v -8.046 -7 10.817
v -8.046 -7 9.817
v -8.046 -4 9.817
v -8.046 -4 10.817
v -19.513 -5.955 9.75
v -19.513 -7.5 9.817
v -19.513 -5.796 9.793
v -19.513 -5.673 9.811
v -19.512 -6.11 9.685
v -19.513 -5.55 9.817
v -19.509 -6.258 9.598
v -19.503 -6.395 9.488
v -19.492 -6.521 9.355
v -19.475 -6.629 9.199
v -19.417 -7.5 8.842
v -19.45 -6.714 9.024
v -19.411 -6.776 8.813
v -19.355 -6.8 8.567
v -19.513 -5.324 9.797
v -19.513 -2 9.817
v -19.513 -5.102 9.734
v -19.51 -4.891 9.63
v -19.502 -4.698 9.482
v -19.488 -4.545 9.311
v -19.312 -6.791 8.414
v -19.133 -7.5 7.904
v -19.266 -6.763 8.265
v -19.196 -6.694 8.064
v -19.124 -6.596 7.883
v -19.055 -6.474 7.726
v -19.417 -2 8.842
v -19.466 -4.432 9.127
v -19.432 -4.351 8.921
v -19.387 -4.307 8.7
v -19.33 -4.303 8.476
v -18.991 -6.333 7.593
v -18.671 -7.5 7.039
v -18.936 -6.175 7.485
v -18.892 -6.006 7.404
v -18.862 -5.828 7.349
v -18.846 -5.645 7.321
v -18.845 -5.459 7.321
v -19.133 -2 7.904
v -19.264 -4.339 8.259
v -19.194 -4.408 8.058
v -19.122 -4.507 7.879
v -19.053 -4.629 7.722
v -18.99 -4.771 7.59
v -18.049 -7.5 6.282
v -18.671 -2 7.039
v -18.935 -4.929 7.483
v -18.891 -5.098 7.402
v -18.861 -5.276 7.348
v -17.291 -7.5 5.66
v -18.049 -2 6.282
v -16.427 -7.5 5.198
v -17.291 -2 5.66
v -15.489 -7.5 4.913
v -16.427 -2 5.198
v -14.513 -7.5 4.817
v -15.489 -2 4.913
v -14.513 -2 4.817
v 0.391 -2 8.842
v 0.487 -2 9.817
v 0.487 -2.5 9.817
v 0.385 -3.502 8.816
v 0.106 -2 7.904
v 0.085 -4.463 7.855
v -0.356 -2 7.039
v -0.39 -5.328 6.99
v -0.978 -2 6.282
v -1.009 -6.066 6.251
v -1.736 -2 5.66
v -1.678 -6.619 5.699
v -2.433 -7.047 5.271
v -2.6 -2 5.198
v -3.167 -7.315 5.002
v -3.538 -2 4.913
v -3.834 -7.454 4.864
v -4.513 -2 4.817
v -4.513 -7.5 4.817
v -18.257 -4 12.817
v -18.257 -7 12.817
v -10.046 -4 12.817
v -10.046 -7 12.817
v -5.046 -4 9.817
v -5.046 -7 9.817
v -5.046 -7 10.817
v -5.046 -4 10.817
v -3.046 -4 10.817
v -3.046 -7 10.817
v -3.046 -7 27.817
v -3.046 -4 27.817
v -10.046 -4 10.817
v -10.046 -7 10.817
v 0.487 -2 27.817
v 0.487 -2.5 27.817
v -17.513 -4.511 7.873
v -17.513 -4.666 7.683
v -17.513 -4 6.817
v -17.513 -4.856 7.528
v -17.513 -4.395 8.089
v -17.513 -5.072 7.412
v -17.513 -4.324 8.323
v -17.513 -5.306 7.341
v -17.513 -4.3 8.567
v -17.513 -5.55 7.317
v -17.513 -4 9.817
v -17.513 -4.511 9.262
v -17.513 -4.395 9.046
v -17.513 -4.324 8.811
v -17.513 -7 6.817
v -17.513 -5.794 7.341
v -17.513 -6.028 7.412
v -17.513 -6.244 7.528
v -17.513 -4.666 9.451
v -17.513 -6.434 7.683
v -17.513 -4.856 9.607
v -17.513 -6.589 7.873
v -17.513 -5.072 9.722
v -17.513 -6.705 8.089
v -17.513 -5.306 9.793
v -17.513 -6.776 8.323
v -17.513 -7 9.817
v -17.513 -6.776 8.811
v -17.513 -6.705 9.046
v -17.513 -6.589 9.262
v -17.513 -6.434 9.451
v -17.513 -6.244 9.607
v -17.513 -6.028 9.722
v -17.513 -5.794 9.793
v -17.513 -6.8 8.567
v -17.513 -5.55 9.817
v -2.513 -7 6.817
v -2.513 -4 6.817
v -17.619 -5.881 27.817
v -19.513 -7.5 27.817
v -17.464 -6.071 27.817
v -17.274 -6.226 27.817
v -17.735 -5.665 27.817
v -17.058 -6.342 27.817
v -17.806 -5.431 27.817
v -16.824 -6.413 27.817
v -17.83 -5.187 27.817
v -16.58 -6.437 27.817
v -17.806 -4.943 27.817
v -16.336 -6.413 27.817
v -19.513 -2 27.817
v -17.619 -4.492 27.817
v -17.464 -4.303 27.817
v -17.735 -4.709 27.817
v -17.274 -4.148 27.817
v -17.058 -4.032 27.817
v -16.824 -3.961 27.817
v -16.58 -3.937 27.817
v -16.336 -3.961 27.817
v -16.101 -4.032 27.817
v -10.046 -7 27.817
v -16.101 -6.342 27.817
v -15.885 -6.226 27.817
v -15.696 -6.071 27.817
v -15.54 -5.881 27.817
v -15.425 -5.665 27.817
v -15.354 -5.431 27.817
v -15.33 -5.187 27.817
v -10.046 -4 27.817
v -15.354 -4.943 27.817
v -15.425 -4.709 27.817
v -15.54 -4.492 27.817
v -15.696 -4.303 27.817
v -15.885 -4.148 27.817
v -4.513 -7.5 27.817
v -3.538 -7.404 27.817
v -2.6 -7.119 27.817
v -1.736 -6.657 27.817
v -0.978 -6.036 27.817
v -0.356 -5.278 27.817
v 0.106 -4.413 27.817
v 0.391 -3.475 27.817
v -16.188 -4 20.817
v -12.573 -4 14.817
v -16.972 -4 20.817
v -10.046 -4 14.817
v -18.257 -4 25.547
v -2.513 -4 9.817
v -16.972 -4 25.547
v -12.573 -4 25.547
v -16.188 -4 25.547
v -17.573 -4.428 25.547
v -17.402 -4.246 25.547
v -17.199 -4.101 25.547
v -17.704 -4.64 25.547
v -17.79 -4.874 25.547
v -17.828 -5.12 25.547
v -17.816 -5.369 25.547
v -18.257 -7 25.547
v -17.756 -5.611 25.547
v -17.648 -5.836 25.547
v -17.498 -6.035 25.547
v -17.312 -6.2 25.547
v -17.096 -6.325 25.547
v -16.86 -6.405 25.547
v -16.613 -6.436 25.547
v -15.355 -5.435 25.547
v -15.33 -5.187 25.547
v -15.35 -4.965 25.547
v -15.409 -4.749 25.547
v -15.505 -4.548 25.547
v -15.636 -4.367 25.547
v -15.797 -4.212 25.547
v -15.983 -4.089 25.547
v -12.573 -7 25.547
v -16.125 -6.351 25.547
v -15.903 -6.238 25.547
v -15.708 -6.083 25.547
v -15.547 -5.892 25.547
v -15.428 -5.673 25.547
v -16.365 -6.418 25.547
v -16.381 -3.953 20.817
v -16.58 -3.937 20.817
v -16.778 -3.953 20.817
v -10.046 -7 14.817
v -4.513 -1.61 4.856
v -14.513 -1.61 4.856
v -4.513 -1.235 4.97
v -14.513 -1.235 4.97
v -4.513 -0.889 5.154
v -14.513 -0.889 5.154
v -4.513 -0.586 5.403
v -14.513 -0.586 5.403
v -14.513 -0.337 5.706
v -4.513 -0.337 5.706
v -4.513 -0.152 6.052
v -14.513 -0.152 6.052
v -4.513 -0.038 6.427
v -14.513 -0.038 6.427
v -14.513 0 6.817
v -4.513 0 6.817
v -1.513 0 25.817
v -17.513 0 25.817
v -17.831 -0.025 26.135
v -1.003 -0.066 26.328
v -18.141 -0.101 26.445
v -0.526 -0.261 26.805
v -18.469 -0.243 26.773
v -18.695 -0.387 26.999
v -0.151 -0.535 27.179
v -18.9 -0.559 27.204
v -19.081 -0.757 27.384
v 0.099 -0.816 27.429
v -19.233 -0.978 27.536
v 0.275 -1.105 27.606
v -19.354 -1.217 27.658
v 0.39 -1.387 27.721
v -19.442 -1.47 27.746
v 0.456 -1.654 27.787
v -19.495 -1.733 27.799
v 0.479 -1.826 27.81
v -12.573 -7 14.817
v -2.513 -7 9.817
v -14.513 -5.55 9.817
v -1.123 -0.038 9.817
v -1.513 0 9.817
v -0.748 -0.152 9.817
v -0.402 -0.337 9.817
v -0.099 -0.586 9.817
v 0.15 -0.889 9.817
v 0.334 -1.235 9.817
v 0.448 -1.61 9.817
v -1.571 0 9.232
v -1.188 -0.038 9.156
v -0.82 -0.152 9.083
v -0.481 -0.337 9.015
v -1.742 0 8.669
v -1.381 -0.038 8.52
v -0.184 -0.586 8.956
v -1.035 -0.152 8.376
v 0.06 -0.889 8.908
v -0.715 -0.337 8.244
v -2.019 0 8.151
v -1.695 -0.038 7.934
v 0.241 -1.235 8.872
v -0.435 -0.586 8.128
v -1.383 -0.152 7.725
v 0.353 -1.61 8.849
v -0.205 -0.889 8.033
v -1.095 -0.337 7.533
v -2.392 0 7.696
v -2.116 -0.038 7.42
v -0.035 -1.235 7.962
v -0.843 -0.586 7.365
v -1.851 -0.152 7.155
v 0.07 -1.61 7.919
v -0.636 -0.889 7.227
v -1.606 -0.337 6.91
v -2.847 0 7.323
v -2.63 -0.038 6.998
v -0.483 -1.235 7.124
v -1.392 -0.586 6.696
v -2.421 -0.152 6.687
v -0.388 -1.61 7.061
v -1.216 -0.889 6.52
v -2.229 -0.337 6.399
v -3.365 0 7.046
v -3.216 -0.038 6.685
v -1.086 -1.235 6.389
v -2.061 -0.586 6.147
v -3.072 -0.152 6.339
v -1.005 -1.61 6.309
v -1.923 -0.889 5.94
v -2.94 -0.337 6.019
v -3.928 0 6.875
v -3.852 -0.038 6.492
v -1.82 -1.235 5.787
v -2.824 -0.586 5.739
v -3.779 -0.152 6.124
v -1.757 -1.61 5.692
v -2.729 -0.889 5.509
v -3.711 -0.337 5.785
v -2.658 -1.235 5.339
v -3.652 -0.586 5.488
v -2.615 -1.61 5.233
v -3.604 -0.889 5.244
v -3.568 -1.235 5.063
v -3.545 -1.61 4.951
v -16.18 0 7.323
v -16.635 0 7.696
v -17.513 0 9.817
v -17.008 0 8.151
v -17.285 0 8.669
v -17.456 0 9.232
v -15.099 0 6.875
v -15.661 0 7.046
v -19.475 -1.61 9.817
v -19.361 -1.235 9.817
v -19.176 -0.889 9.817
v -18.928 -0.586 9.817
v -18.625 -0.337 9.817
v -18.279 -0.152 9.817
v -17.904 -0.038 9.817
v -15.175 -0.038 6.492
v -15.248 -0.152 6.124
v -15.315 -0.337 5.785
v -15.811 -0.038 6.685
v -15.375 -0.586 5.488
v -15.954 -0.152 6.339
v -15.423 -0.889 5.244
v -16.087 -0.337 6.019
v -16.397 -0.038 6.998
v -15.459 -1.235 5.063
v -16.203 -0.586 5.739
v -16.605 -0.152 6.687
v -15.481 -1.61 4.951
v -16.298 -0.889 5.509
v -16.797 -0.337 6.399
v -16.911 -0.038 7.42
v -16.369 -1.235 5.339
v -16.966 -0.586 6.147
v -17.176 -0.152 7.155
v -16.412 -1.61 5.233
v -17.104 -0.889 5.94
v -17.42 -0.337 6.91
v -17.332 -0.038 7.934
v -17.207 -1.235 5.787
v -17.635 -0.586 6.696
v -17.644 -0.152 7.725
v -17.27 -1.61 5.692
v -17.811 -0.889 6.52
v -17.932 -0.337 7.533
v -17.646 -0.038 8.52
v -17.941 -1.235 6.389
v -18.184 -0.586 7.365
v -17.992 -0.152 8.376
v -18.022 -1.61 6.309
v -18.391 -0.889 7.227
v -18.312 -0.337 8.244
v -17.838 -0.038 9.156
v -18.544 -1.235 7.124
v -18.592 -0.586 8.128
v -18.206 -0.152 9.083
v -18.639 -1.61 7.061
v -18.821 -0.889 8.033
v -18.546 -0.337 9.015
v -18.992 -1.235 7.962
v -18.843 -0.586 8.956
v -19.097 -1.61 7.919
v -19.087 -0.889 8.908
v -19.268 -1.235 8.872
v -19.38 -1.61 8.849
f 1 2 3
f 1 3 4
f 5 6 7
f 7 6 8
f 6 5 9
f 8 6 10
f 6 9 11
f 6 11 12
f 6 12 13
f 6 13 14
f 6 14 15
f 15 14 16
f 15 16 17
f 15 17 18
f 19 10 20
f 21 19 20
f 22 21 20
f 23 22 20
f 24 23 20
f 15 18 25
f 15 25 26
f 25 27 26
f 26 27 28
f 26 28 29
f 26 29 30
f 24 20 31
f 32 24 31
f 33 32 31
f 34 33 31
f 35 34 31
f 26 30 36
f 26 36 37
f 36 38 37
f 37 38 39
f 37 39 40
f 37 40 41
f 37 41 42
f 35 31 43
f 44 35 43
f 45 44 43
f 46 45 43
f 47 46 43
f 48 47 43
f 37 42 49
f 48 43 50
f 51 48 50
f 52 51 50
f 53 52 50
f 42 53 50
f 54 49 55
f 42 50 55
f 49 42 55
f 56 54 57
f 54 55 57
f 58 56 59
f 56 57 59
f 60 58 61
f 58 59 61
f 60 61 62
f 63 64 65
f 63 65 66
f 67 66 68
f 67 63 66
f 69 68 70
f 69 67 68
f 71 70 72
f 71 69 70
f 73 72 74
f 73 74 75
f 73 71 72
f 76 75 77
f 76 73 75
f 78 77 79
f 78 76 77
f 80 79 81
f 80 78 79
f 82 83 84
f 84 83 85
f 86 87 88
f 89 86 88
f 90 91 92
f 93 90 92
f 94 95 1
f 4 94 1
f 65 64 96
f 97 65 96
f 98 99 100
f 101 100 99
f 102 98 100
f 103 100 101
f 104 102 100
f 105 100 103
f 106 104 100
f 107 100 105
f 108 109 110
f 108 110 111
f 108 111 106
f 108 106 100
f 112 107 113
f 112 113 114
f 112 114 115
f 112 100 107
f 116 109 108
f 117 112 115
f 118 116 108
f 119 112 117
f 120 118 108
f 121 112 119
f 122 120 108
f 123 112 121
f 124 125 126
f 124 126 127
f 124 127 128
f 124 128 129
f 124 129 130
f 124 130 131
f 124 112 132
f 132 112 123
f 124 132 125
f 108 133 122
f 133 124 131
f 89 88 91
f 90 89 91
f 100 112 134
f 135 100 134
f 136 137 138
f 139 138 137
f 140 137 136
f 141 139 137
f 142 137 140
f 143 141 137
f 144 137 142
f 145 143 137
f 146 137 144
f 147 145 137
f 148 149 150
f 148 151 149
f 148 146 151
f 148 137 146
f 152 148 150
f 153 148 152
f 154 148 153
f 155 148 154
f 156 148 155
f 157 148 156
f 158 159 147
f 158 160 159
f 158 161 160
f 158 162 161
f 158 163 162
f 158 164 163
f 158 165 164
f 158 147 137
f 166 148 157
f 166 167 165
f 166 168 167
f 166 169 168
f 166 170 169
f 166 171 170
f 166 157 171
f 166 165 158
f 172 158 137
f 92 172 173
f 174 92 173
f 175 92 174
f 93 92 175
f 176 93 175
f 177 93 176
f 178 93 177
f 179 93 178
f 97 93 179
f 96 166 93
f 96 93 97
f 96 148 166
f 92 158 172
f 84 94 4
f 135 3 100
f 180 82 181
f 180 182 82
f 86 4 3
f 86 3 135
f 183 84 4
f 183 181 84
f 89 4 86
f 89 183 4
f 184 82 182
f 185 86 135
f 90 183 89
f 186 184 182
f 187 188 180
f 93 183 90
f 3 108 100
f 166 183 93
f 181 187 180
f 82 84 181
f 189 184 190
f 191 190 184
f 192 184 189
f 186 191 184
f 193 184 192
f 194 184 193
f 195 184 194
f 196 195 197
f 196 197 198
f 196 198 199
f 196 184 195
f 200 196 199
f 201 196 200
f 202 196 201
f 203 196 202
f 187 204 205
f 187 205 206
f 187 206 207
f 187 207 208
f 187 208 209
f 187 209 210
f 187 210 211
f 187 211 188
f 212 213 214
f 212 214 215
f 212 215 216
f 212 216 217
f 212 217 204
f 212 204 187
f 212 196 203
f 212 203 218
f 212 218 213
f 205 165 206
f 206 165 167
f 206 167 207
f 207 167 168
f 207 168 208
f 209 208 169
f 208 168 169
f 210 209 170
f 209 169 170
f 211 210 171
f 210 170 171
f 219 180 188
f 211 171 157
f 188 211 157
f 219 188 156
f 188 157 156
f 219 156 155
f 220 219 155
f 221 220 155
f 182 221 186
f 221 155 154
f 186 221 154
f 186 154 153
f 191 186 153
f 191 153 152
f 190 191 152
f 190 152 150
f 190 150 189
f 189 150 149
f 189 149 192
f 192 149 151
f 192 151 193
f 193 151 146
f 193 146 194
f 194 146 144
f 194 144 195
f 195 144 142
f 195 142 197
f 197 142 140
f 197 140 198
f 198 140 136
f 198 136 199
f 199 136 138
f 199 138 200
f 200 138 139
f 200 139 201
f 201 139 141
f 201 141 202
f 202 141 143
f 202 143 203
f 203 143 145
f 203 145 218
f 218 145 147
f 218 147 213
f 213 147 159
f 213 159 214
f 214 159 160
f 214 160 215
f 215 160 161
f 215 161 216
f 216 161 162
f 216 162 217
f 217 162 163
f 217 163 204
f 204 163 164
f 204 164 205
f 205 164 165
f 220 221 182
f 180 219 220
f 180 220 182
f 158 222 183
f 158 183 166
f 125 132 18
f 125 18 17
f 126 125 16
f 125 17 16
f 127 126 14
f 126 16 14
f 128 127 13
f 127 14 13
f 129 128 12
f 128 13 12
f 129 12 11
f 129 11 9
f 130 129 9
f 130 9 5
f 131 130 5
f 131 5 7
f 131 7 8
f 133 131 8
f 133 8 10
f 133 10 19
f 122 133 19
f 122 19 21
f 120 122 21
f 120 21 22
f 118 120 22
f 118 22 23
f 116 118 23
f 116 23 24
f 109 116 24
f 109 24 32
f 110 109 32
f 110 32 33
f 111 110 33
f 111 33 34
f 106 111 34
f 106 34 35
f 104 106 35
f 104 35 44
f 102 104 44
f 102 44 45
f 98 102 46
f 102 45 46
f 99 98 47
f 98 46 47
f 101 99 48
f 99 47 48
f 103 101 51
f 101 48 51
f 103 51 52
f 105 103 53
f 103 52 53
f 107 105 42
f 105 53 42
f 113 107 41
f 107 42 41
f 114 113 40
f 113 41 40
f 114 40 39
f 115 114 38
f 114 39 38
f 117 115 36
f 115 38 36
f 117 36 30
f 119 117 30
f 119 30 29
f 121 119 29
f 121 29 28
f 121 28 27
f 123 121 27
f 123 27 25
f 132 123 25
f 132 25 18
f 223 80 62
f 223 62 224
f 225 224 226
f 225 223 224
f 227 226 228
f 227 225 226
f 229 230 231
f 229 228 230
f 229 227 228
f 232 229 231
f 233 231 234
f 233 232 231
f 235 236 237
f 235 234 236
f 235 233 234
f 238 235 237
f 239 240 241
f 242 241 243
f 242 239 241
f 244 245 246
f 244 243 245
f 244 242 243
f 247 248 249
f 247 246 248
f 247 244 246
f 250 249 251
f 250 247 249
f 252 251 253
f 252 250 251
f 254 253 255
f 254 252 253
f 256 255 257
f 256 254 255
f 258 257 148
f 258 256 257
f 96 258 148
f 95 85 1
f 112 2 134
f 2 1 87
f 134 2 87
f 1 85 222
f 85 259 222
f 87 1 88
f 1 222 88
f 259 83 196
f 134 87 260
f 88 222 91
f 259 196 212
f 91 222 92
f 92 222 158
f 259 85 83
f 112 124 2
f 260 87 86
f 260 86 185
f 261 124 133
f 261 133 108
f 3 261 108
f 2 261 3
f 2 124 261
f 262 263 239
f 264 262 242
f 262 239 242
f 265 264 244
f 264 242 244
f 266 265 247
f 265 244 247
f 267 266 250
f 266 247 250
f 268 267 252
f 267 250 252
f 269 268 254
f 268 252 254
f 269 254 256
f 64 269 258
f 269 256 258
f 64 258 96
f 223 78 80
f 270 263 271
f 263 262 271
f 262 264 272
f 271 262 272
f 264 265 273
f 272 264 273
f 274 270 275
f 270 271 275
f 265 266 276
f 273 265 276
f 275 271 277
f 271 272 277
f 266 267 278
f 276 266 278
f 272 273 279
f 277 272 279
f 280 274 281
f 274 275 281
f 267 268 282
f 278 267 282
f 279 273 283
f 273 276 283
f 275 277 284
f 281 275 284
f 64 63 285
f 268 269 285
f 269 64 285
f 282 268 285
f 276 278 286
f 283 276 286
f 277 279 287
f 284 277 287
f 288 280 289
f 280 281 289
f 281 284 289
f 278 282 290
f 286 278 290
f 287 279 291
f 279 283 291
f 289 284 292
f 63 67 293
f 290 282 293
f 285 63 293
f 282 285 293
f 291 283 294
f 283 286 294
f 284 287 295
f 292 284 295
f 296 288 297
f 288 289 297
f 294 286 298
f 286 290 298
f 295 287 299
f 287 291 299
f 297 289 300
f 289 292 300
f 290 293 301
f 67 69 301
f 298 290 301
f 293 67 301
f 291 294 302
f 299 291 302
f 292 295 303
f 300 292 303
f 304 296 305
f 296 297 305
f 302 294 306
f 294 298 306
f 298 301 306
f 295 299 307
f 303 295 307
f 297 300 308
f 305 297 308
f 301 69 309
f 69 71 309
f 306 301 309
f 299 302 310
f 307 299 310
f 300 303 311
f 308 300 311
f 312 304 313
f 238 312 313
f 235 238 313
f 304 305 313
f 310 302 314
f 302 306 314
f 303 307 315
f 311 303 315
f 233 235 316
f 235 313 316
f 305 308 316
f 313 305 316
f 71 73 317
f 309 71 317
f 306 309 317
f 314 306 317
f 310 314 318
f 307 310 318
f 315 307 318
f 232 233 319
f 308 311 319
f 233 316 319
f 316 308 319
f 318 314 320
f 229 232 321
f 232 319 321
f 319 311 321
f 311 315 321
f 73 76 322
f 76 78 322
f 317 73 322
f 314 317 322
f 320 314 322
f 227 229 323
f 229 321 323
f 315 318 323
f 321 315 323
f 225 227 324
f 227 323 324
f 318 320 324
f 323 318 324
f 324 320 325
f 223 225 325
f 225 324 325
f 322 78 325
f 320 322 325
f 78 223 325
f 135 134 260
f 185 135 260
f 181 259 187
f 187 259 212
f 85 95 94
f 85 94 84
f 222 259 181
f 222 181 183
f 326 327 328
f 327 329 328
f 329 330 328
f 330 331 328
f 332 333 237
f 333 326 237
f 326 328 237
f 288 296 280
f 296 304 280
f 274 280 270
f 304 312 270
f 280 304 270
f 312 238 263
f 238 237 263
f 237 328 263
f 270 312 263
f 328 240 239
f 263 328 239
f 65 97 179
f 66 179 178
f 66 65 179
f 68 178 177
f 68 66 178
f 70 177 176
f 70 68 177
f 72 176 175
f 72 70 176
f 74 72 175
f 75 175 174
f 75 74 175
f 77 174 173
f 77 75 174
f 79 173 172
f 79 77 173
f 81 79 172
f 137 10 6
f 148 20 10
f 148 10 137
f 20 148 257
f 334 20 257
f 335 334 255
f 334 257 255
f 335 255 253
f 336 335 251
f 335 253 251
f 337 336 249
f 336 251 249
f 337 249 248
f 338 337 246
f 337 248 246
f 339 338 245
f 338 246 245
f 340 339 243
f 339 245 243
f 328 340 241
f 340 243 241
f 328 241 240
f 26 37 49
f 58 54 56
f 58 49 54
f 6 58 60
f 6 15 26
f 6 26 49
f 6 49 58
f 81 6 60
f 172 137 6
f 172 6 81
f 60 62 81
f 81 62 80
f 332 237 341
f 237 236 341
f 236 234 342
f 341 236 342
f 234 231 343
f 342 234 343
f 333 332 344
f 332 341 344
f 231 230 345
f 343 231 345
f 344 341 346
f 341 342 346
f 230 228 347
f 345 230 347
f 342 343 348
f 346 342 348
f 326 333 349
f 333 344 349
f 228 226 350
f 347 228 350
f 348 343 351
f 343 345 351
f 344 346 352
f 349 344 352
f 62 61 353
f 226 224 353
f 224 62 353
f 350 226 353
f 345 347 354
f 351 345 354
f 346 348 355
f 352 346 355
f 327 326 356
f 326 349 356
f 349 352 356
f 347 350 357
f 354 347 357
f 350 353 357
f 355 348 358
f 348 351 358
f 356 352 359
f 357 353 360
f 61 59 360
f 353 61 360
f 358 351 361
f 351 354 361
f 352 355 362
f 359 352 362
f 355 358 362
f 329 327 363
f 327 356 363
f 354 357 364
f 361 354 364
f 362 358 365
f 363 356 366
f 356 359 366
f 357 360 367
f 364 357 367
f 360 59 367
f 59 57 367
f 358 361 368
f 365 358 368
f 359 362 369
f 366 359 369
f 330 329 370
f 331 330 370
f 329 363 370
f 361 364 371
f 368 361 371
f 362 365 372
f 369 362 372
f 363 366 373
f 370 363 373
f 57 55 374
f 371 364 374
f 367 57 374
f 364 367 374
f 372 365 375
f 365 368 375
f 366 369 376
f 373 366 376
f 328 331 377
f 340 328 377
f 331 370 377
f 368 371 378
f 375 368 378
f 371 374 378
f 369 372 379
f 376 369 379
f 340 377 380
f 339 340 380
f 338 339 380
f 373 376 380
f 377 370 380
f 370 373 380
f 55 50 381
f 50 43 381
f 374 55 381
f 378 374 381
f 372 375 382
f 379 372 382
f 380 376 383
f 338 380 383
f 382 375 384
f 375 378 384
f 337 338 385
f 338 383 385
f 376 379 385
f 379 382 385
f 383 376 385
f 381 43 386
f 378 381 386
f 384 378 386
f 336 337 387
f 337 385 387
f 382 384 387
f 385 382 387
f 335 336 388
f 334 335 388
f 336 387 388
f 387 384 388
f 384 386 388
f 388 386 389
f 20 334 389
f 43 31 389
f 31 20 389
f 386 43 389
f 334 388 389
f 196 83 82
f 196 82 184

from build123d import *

# Parameters (mm, degrees)
F0_W         = 20
F0_H         = 23
F1_DEPTH     = 7
F2_W         = 15
F2_H         = 3
F3_DEPTH     = 3
F4_W         = 7
F4_H         = 17
F5_DEPTH     = 3
F6_W         = 3
F6_H         = 1
F7_DEPTH     = 3
F8_W         = 2.5268201925
F8_H         = 2
F9_DEPTH     = 3
F10_R        = 1.25
F11_DEPTH    = 5
F12_R        = 2
F13_W        = 5.6845681682
F13_H        = 12.7295220874
F14_DEPTH    = 3
F15_W        = 20
F15_H        = 23
F16_DEPTH    = 0.5
F17_T1_DEPTH = 20
F17_T3_DEPTH = 48
F17_T6_ANGLE = 90
F17_T8_ANGLE = 90
F18_R        = 1.25
F19_DEPTH    = 7


# Not quite as in the source:
# - a fillet or chamfer that OpenCascade refuses, or shapes differently, is made with other operations: its cross-section is extruded or revolved along the edge and cut away or added


with BuildPart() as f1:
    # F0 (on Front) → F1 (new body)
    with BuildSketch(Plane.XZ):
        with Locations((-9.5134219155, 16.3173061975)):
            Rectangle(F0_W, F0_H)
    extrude(amount=F1_DEPTH)

    # F2 (on face) → F3 (cut)
    with BuildSketch(Plane.XZ.offset(7)):
        with Locations((-10.0134219155, 8.3173061975)):
            Rectangle(F2_W, F2_H)
    extrude(amount=-F3_DEPTH, mode=Mode.SUBTRACT)

    # F4 (on face) → F5 (cut)
    with BuildSketch(Plane.XZ.offset(7)):
        with Locations((-6.5459148027, 19.3173061975)):
            Rectangle(F4_W, F4_H)
    extrude(amount=-F5_DEPTH, mode=Mode.SUBTRACT)

    # F6 (on face) → F7 (cut)
    with BuildSketch(Plane.XZ.offset(7)):
        with Locations((-6.5459148027, 10.3173061975)):
            Rectangle(F6_W, F6_H)
    extrude(amount=-F7_DEPTH, mode=Mode.SUBTRACT)

    # F8 (on face) → F9 (cut)
    with BuildSketch(Plane.XZ.offset(7)):
        with Locations((-11.3093248989, 13.8173061975)):
            Rectangle(F8_W, F8_H)
    extrude(amount=-F9_DEPTH, mode=Mode.SUBTRACT)

    # F10 (on face) → F11 (cut)
    with BuildSketch(Plane(origin=(-19.5134219155, 0, 0), x_dir=(0, -1, 0), z_dir=(-1, 0, 0))):
        with Locations((5.55, 8.5673061975)):
            Circle(F10_R)
    extrude(amount=-F11_DEPTH, mode=Mode.SUBTRACT)

    # F12
    f12_edges = [f1.edges().sort_by_distance(p)[0] for p in [
        (0.486578, 0, 16.317306),
        (-19.513422, 0, 16.317306),
        (-9.513422, 0, 27.817306),
        (-9.513422, 0, 4.817306),
    ]]
    fillet(f12_edges, radius=F12_R)

    # F13 (on face) → F14 (cut)
    with BuildSketch(Plane.XZ.offset(7)):
        with Locations((-15.4150190793, 19.1820672412)):
            Rectangle(F13_W, F13_H)
    extrude(amount=-F14_DEPTH, mode=Mode.SUBTRACT)

    # F15 (on face) → F16 (join)
    with BuildSketch(Plane.XZ.offset(7)):
        with Locations((-9.5134219155, 16.3173061975)):
            Rectangle(F15_W, F15_H)
    extrude(amount=F16_DEPTH)

    # F17: fillet of radius 5 on 3 edges, made by hand

    # F17_s2 → F17_t1 (cut)
    with BuildSketch(Plane.XZ):
        with BuildLine():
            ThreePointArc((-19.5134219155, 9.8173061975), (-18.0489558214, 6.2817722916), (-14.5134219155, 4.8173061975))
            Line((-14.5134219155, 4.8173061975), (-19.5134219155, 4.8173061975))
            Line((-19.5134219155, 4.8173061975), (-19.5134219155, 9.8173061975))
        make_face()
        with BuildLine():
            ThreePointArc((0.4865780845, 9.8173061975), (-0.9778880095, 6.2817722916), (-4.5134219155, 4.8173061975))
            Line((-4.5134219155, 4.8173061975), (0.4865780845, 4.8173061975))
            Line((0.4865780845, 4.8173061975), (0.4865780845, 9.8173061975))
        make_face()
    extrude(amount=F17_T1_DEPTH, mode=Mode.SUBTRACT)

    # F17_s4 → F17_t3 (cut)
    with BuildSketch(Plane.XY.offset(-7.6826938025)):
        with BuildLine():
            ThreePointArc((0.4865780845, -2.5), (-0.9778880095, -6.0355339059), (-4.5134219155, -7.5))
            Line((-4.5134219155, -7.5), (0.4865780845, -7.5))
            Line((0.4865780845, -7.5), (0.4865780845, -2.5))
        make_face()
    extrude(amount=F17_T3_DEPTH, mode=Mode.SUBTRACT)

    # F17_s5 → F17_t6 (revolve, cut)
    with BuildSketch(Plane.XY.offset(9.8173061975)):
        with BuildLine():
            ThreePointArc((-1.5134219155, 0), (-0.0992083531, -0.5857864376), (0.4865780845, -2))
            Line((0.4865780845, -2), (0.4865780845, 0))
            Line((0.4865780845, 0), (-1.5134219155, 0))
        make_face()
    revolve(axis=Axis((-4.5134219155, 0, 9.8173061975), (0, 1, 0)), revolution_arc=F17_T6_ANGLE, mode=Mode.SUBTRACT)

    # F17_s7 → F17_t8 (revolve, cut)
    with BuildSketch(Plane.YZ.offset(-14.5134219155)):
        with BuildLine():
            ThreePointArc((0, 6.8173061975), (-0.5857864376, 5.4030926351), (-2, 4.8173061975))
            Line((-2, 4.8173061975), (0, 4.8173061975))
            Line((0, 4.8173061975), (0, 6.8173061975))
        make_face()
    revolve(axis=Axis((-14.5134219155, 0, 9.8173061975), (0, 1, 0)), revolution_arc=F17_T8_ANGLE, mode=Mode.SUBTRACT)

    # F18 (on face) → F19 (cut)
    with BuildSketch(Plane.XY.offset(27.8173061975)):
        with Locations((-16.5796671063, -5.1869219169)):
            Circle(F18_R)
    extrude(amount=-F19_DEPTH, mode=Mode.SUBTRACT)


solid = f1.part
